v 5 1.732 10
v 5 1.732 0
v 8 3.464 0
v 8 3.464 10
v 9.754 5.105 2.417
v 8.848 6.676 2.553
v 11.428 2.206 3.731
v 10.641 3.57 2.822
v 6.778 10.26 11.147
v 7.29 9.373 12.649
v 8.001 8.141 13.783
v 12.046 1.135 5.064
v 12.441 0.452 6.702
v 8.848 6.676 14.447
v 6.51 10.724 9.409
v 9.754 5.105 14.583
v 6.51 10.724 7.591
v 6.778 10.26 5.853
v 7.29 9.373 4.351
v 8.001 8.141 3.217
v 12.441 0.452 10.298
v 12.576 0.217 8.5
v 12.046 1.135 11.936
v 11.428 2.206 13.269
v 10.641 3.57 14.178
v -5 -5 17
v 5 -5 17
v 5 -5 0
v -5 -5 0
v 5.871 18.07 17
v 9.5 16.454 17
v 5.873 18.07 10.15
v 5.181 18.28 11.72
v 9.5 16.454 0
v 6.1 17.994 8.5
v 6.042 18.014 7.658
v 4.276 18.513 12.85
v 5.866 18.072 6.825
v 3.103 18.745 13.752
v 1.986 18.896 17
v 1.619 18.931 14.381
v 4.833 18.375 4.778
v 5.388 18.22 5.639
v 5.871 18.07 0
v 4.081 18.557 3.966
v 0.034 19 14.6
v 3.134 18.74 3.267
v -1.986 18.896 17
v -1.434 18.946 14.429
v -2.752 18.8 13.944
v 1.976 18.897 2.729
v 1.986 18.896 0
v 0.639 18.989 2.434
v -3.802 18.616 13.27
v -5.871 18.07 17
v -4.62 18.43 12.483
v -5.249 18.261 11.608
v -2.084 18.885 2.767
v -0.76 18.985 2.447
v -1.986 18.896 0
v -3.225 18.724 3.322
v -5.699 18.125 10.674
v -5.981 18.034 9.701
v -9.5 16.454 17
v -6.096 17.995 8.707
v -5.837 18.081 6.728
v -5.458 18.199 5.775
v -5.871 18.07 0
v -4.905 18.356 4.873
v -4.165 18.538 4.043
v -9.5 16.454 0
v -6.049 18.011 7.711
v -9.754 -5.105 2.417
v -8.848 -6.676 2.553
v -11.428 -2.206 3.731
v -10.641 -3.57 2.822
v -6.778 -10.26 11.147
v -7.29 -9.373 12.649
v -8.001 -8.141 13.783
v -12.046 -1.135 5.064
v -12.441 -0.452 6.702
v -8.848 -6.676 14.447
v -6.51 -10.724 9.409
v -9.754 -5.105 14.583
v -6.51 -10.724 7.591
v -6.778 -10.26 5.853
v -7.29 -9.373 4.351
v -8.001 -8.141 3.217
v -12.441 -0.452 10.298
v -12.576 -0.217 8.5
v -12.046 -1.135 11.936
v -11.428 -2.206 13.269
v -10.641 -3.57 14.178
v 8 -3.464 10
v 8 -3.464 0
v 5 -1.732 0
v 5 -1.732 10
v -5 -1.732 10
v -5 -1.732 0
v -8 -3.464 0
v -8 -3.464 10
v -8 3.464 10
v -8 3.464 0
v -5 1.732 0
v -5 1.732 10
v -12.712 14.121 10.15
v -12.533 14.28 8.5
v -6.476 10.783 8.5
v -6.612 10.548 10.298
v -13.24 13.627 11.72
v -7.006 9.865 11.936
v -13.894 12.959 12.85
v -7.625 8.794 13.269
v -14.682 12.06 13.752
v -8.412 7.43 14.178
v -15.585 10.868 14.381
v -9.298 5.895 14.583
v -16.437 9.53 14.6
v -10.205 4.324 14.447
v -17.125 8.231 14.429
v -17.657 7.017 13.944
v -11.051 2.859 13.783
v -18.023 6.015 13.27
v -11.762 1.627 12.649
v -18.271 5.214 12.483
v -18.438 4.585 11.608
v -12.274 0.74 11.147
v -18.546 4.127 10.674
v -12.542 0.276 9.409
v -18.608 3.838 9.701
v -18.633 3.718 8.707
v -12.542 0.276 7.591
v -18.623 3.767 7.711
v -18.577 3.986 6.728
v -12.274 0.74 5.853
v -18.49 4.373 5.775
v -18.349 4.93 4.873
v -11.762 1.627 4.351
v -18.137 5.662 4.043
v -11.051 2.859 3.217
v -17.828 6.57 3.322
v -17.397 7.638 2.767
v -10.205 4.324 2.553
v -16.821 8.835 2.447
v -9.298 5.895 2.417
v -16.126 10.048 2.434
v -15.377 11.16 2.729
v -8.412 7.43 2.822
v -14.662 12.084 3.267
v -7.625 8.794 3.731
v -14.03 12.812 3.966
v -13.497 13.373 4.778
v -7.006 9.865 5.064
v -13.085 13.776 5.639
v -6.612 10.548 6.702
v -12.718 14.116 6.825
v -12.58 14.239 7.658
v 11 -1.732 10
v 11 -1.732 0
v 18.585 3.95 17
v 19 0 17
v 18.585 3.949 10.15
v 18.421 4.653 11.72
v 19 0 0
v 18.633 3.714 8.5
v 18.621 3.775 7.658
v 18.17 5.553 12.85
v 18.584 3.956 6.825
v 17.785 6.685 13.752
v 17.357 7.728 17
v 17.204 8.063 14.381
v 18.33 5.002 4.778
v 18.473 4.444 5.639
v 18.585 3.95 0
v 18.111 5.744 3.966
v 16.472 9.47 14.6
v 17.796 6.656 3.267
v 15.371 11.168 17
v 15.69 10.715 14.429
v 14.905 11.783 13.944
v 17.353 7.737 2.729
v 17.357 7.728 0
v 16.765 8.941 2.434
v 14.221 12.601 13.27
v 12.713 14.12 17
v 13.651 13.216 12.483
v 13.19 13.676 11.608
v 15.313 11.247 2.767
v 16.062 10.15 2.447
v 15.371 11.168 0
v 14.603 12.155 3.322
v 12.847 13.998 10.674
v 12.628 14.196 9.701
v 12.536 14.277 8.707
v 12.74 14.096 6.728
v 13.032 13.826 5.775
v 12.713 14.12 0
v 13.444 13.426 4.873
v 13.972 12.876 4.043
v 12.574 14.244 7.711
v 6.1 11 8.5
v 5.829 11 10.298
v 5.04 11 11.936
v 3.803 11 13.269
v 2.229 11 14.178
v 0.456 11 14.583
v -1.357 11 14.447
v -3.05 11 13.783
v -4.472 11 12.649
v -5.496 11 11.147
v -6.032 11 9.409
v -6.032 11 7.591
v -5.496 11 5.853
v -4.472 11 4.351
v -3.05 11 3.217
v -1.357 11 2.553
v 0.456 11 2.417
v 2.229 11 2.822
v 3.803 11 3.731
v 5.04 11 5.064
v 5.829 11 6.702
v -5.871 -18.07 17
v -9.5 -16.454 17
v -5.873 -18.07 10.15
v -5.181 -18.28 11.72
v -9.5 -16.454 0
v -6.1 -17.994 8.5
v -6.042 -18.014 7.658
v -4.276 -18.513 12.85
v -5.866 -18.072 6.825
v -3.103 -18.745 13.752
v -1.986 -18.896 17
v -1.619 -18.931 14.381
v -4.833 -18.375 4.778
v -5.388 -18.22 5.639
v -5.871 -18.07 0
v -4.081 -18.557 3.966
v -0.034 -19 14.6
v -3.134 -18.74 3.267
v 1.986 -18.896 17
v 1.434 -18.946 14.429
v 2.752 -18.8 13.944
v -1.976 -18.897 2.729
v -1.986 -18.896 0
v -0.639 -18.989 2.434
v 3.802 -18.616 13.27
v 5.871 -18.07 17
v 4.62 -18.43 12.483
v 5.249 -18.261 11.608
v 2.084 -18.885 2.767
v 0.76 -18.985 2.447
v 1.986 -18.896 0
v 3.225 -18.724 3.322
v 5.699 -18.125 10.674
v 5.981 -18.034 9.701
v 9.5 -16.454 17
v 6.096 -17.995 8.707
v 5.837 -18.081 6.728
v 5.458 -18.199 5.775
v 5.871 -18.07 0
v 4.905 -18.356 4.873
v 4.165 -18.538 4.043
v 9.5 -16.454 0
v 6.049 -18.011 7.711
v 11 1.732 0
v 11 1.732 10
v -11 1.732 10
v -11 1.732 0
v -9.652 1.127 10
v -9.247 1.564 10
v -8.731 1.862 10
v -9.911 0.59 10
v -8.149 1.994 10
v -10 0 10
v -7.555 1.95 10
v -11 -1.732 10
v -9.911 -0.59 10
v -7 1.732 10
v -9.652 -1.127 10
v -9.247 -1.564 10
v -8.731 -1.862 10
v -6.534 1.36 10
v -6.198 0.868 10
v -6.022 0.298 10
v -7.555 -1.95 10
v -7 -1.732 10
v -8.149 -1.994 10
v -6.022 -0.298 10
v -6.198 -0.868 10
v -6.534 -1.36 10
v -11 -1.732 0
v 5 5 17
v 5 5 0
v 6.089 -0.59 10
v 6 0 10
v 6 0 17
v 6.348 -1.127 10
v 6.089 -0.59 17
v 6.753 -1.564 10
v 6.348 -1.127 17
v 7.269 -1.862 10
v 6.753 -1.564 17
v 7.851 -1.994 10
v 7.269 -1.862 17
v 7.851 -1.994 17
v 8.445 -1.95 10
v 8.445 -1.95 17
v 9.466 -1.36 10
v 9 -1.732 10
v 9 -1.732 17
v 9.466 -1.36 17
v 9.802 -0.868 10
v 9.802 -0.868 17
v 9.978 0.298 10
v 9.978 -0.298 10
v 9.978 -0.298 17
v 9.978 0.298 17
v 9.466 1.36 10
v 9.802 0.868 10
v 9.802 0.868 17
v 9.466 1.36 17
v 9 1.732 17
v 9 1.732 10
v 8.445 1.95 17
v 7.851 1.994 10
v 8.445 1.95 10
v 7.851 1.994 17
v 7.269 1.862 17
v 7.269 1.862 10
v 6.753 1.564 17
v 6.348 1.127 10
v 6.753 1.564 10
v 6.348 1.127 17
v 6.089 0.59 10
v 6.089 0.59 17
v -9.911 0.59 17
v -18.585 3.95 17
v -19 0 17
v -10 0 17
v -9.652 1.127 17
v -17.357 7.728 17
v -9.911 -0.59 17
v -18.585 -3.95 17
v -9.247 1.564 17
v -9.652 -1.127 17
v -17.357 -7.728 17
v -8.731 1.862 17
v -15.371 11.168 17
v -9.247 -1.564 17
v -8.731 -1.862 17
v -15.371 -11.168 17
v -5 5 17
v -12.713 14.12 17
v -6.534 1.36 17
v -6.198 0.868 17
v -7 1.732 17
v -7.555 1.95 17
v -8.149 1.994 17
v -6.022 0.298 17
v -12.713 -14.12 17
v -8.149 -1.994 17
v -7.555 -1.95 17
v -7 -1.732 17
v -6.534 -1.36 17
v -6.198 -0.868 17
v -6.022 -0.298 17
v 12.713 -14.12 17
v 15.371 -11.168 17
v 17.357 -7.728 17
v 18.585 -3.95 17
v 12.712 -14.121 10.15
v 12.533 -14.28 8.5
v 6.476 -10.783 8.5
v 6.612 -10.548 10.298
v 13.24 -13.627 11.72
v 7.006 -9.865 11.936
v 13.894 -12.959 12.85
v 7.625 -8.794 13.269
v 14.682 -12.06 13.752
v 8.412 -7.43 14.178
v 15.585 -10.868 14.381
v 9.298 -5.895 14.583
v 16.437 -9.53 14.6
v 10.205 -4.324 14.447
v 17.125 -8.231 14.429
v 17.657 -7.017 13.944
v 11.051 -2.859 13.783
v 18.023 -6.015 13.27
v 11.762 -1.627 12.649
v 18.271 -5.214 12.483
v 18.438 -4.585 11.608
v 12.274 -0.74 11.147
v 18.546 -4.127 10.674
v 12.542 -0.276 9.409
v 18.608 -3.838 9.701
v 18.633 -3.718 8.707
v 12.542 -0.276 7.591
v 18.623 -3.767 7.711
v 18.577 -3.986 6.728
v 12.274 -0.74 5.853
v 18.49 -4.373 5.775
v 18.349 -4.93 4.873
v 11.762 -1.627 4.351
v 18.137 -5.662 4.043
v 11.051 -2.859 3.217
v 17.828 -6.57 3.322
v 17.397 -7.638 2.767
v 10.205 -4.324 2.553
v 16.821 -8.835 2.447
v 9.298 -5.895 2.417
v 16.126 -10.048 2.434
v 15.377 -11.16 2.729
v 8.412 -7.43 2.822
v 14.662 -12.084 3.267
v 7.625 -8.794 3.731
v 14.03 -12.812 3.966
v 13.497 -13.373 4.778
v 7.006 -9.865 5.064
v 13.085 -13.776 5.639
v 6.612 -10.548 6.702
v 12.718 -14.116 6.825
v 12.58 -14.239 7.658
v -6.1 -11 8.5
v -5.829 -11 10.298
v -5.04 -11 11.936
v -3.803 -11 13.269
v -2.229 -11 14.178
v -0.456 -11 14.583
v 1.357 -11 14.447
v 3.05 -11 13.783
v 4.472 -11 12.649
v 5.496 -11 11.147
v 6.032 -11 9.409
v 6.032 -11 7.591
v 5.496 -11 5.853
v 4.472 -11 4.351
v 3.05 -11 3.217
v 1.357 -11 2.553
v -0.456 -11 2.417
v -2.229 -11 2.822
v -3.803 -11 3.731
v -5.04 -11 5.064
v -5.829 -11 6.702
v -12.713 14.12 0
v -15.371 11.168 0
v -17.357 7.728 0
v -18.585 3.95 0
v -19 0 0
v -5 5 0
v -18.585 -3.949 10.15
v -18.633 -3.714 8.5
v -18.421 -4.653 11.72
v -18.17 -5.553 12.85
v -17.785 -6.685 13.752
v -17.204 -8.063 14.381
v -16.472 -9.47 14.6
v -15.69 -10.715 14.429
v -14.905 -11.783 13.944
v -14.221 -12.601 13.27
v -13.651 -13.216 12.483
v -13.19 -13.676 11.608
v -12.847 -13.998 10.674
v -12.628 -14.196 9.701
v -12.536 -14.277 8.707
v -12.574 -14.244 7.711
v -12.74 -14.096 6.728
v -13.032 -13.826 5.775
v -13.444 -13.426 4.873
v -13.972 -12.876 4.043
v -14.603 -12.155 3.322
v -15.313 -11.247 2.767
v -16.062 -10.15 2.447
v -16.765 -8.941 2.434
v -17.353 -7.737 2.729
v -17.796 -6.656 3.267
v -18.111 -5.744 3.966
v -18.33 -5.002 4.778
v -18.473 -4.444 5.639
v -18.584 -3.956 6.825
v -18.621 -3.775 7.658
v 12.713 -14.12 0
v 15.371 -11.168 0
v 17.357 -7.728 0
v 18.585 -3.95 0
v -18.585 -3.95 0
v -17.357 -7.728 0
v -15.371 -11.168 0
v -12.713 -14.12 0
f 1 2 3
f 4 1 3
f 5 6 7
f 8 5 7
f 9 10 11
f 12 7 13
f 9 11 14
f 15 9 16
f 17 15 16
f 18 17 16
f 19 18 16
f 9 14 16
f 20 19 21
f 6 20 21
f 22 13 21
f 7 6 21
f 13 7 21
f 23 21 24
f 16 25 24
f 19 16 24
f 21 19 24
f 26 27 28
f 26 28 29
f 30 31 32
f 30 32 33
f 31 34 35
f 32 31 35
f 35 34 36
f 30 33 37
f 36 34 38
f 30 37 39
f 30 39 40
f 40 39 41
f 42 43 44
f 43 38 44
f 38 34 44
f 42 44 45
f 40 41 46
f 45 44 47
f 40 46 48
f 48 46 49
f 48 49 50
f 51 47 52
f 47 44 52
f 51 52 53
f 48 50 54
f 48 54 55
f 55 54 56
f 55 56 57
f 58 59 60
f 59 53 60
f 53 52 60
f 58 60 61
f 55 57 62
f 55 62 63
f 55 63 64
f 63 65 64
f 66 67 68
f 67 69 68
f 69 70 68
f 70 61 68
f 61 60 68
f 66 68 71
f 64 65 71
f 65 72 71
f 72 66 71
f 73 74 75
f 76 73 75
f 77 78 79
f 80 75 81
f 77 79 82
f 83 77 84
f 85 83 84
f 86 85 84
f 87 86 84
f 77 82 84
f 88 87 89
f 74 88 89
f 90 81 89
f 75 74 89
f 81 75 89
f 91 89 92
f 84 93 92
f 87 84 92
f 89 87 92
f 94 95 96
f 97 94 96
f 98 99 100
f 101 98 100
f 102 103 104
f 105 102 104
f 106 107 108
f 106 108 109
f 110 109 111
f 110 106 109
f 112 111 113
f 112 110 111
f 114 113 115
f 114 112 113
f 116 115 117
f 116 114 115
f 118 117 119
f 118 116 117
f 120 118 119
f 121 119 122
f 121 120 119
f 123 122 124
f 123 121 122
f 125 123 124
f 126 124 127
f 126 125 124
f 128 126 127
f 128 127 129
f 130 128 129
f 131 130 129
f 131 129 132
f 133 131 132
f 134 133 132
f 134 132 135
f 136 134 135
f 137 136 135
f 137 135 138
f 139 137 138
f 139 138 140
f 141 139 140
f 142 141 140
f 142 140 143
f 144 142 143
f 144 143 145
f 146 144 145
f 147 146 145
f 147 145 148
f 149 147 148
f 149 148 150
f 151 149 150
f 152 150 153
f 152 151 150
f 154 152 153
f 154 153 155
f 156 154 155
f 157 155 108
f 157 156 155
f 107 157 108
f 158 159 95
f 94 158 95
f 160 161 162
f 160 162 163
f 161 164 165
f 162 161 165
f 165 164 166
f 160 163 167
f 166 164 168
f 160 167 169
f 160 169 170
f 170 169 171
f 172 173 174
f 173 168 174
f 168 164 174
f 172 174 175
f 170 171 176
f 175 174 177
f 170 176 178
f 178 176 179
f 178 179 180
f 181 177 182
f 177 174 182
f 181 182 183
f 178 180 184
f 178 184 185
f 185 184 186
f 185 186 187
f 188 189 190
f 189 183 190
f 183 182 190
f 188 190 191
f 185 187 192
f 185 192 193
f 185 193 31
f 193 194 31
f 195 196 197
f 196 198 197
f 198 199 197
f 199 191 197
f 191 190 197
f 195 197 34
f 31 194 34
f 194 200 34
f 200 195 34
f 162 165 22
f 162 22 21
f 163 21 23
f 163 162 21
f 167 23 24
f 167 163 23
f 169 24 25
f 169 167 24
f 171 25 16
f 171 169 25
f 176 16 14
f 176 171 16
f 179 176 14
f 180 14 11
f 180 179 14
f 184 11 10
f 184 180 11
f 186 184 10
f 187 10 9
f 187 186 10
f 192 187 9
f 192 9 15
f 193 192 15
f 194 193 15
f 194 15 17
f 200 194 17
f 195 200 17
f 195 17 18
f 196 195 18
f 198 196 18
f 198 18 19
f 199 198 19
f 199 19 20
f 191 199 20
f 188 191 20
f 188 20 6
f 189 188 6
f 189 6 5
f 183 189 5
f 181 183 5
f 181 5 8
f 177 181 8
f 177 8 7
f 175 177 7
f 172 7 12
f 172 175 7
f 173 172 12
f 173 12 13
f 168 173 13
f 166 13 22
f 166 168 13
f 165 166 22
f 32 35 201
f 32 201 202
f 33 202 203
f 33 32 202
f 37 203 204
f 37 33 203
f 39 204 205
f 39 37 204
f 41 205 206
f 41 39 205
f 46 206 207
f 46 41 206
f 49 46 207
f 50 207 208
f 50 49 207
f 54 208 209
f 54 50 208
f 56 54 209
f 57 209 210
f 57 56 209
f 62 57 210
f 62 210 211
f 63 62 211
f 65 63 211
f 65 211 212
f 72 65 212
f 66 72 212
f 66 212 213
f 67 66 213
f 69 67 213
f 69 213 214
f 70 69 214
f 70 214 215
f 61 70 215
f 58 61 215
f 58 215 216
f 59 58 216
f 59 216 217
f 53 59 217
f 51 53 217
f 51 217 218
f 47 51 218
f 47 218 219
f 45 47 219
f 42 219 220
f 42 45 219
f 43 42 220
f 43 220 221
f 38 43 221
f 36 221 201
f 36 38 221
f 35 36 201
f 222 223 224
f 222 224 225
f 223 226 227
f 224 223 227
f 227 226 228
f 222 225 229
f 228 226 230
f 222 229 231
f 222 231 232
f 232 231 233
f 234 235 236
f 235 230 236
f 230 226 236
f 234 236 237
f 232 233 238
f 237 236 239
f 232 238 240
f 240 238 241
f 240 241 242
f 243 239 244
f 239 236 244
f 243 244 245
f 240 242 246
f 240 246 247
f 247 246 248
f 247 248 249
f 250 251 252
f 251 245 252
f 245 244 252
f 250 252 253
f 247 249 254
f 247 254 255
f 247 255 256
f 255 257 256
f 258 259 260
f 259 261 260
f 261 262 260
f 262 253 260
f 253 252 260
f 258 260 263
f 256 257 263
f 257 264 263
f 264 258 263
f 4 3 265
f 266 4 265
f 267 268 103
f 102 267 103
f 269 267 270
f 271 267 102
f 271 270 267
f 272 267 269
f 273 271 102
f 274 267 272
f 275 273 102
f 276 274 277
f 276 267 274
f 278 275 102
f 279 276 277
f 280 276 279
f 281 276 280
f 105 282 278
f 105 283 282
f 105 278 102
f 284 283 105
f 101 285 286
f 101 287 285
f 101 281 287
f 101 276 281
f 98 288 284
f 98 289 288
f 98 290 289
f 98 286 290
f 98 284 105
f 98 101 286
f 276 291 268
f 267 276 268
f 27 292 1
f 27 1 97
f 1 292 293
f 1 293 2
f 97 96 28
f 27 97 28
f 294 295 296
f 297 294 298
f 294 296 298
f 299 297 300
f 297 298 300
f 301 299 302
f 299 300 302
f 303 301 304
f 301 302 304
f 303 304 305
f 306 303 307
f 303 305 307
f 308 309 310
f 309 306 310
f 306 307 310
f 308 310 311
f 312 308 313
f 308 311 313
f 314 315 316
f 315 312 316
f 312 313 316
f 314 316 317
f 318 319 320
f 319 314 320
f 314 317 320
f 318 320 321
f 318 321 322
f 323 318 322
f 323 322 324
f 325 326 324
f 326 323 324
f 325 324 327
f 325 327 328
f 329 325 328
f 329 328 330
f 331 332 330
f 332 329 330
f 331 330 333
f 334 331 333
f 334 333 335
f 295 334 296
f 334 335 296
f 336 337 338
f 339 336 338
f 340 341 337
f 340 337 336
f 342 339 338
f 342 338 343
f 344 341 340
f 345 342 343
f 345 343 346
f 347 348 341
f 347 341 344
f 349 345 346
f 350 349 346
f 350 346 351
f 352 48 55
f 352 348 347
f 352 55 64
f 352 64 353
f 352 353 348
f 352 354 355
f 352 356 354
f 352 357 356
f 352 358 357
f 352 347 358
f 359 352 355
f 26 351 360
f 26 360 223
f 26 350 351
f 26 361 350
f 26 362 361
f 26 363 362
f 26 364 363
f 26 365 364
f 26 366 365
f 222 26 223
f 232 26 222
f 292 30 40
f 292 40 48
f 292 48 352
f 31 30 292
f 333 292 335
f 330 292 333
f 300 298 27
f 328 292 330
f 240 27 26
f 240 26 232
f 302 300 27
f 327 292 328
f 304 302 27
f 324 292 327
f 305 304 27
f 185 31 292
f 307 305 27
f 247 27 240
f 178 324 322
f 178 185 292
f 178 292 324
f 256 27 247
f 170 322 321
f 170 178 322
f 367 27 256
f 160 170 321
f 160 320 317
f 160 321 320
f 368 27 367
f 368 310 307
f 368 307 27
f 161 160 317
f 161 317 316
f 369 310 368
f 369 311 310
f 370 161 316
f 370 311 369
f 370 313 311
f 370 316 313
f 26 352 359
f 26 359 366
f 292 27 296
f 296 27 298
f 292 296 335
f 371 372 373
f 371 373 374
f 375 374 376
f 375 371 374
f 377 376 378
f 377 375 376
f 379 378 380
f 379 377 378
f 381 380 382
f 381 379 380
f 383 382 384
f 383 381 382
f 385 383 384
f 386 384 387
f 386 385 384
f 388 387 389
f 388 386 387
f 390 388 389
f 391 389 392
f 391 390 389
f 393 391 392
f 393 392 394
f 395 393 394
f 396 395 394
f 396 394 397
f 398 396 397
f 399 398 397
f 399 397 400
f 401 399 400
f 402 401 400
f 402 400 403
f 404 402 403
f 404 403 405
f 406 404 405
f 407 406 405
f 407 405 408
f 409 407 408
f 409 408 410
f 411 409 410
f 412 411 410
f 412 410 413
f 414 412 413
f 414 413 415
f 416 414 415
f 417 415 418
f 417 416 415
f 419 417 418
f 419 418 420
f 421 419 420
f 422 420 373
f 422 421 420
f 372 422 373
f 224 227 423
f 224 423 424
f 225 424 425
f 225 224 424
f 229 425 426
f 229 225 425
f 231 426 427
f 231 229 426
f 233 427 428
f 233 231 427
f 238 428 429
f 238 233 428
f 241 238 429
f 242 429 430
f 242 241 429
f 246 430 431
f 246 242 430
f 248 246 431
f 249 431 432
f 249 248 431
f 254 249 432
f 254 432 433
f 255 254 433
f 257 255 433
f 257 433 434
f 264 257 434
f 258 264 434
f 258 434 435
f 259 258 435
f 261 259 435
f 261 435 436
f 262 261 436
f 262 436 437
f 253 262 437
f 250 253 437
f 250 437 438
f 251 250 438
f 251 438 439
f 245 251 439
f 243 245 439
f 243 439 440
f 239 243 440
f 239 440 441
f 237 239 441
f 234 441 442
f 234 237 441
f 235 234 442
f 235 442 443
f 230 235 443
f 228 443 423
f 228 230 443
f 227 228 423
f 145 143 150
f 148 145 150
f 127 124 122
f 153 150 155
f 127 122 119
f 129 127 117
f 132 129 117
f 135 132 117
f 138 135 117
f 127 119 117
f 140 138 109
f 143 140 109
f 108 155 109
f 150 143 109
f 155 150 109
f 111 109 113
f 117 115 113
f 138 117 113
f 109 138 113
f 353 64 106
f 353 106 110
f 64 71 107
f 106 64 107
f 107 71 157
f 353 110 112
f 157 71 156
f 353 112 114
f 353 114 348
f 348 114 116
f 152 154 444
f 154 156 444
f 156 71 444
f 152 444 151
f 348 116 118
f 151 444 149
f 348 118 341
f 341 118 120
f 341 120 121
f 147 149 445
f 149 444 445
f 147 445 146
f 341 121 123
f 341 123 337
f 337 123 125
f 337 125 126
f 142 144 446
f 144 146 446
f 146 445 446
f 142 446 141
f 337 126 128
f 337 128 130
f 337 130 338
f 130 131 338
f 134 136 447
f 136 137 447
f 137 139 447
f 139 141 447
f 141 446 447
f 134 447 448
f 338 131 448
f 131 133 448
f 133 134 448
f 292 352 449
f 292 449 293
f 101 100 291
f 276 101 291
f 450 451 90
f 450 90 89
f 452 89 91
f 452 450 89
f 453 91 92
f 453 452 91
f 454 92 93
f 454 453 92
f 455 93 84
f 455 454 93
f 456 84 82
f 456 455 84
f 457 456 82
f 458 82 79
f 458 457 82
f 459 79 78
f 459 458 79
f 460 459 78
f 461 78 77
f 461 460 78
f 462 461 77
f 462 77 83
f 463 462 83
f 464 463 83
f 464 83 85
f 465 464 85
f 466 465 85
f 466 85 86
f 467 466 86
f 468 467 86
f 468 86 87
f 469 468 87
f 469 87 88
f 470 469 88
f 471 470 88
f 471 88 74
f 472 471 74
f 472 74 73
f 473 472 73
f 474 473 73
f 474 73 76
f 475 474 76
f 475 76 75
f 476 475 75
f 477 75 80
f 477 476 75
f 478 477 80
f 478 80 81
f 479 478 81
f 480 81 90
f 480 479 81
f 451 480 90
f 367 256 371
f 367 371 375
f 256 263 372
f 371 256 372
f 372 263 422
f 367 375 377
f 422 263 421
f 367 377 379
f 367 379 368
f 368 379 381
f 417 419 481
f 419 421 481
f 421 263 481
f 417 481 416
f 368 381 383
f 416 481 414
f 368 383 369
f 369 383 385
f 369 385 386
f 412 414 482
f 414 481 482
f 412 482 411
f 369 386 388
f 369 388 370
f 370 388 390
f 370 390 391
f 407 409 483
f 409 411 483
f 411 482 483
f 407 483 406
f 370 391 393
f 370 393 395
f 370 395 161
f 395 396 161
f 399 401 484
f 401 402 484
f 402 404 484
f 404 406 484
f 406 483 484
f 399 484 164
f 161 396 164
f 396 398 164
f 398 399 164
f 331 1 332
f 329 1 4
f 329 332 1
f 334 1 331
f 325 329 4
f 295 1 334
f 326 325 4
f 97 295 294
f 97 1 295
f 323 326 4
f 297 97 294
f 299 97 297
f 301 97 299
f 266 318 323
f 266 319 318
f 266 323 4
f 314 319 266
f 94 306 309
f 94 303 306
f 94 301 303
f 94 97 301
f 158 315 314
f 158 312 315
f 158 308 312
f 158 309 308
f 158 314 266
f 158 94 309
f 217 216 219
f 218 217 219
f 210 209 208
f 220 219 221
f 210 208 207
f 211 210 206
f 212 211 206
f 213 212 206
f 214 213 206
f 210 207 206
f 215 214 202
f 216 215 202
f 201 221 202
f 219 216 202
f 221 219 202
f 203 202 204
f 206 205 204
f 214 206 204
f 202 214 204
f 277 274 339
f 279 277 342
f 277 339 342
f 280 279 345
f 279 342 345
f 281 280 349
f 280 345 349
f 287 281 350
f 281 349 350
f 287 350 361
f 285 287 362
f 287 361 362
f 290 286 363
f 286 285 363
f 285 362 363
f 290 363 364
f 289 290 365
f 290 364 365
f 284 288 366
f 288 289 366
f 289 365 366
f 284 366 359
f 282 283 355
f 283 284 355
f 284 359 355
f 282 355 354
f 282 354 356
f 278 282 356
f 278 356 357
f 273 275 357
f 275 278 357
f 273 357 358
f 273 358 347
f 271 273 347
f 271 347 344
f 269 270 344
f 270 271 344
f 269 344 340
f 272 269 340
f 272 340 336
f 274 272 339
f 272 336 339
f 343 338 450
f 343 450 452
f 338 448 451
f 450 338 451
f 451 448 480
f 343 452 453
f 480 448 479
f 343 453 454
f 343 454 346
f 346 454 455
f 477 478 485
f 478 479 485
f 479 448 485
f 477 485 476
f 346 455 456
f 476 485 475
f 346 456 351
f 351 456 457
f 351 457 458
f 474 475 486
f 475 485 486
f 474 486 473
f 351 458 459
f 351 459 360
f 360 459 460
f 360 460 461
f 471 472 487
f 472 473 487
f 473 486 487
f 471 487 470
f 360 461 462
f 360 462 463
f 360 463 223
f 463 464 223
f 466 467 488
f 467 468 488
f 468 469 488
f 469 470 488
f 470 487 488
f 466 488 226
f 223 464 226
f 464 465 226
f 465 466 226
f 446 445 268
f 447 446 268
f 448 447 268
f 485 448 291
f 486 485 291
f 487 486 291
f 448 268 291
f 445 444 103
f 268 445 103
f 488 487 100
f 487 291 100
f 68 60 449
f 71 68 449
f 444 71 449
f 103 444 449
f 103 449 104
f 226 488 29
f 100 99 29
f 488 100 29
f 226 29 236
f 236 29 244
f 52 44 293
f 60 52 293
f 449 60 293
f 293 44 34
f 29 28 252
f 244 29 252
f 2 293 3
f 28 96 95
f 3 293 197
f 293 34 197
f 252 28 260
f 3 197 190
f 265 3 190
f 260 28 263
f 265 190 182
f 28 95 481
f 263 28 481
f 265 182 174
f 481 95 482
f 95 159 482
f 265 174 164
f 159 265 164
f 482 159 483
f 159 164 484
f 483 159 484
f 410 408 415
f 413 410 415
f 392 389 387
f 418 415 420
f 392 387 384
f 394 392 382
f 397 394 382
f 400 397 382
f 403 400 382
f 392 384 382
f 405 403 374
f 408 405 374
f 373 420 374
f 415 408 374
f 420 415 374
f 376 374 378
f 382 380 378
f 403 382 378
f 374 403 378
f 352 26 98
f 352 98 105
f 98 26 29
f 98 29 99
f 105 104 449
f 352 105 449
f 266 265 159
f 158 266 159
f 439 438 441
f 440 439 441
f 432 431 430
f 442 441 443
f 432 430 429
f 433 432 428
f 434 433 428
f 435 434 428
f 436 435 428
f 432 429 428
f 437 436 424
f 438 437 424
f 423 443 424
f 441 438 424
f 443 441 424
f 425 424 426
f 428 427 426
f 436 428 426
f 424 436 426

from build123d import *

# Parameters (mm, degrees)
F1_DEPTH  = 17
F5_R      = 6.1
F6_DEPTH  = 9
F7_COUNT  = 6
F9_D      = 4
F10_R     = 2
F11_DEPTH = 10
F12_DEPTH = 17.0010001


with BuildPart() as f1:
    # F0 (on Top) → F1 (new body)
    with BuildSketch(Plane.XY):
        with BuildLine():
            Line((0, 0), (9.5, 16.4544826719))
            ThreePointArc((9.5, 16.4544826719), (0, 19), (-9.5, 16.4544826719))
            Line((-9.5, 16.4544826719), (0, 0))
        make_face()
    extrude(amount=F1_DEPTH)

    # F5 (on offset) → F6 (cut)
    with BuildSketch(Plane.XZ.offset(-20)):
        with Locations((0, 8.5)):
            Circle(F5_R)
    extrude(amount=F6_DEPTH, mode=Mode.SUBTRACT)

    # F7: F1 ×6 about axis
    f7_axis = Axis((0, 0, 0), (0, 0, 1))


with BuildPart() as f1_1:
    add(f1.part)
    for i in range(1, F7_COUNT):
        add(f1.part.rotate(f7_axis, i * 360 / F7_COUNT))

    # F9 (through all)
    with Locations(Plane(origin=(0, 0, 0), x_dir=(1, 0, 0), z_dir=(0, 0, -1))):
        with Locations((-8, 0), (8, 0)):
            Hole(F9_D / 2)

    # F10 (on face) → F11 (cut)
    with BuildSketch(Plane(origin=(0, 0, 0), x_dir=(1, 0, 0), z_dir=(0, 0, -1))):
        Polygon((-5, -1.7320508076), (-5, 1.7320508076), (-8, 3.4641016151), (-11, 1.7320508076), (-11, -1.7320508076), (-8, -3.4641016151), align=None)
        with Locations((-8, 0)):
            Circle(F10_R, mode=Mode.SUBTRACT)
        Polygon((5, 1.7320508076), (5, -1.7320508076), (8, -3.4641016151), (11, -1.7320508076), (11, 1.7320508076), (8, 3.4641016151), align=None)
        with Locations((8, 0)):
            Circle(F10_R, mode=Mode.SUBTRACT)
    extrude(amount=-F11_DEPTH, mode=Mode.SUBTRACT)

    # F8 (on face) → F12 (cut, through all)
    with BuildSketch(Plane(origin=(0, 0, 0), x_dir=(1, 0, 0), z_dir=(0, 0, -1))):
        with BuildLine():
            Line((0, 2.1), (0, 5))
            Line((0, 5), (-5, 5))
            Line((-5, 5), (-5, -5))
            Line((-5, -5), (5, -5))
            Line((5, -5), (5, 5))
            Line((5, 5), (2.8867513459, 5))
            Line((2.8867513459, 5), (1.05, 1.8186533479))
            ThreePointArc((1.05, 1.8186533479), (1.0751032483, 1.8039271065), (1.1, 1.788854382))
            ThreePointArc((1.1, 1.788854382), (1.833030278, 1.0246950766), (2.1, 0))
            ThreePointArc((2.1, 0), (1.833030278, -1.0246950766), (1.1, -1.788854382))
            ThreePointArc((1.1, -1.788854382), (0, -2.1), (-1.1, -1.788854382))
            ThreePointArc((-1.1, -1.788854382), (-2.1, 0), (-1.1, 1.788854382))
            ThreePointArc((-1.1, 1.788854382), (-0.5715793024, 2.020716977), (0, 2.1))
        make_face()
        with BuildLine():
            Line((2.8867513459, 5), (0, 5))
            Line((0, 5), (0, 2.1))
            ThreePointArc((0, 2.1), (0.5435199947, 2.0284442352), (1.05, 1.8186533479))
            Line((1.05, 1.8186533479), (2.8867513459, 5))
        make_face()
        with BuildLine():
            Line((0, 0), (0, 2.1))
            ThreePointArc((0, 2.1), (-0.5715793024, 2.020716977), (-1.1, 1.788854382))
            Line((-1.1, 1.788854382), (-1.1, -1.788854382))
            ThreePointArc((-1.1, -1.788854382), (0, -2.1), (1.1, -1.788854382))
            Line((1.1, -1.788854382), (1.1, 1.788854382))
            ThreePointArc((1.1, 1.788854382), (1.0751032483, 1.8039271065), (1.05, 1.8186533479))
            Line((1.05, 1.8186533479), (0, 0))
        make_face()
        with BuildLine():
            Line((-1.1, -1.788854382), (-1.1, 1.788854382))
            ThreePointArc((-1.1, 1.788854382), (-2.1, 0), (-1.1, -1.788854382))
        make_face()
        with BuildLine():
            ThreePointArc((2.1, 0), (1.833030278, 1.0246950766), (1.1, 1.788854382))
            Line((1.1, 1.788854382), (1.1, -1.788854382))
            ThreePointArc((1.1, -1.788854382), (1.833030278, -1.0246950766), (2.1, 0))
        make_face()
        with BuildLine():
            ThreePointArc((1.05, 1.8186533479), (0.5435199947, 2.0284442352), (0, 2.1))
            Line((0, 2.1), (0, 0))
            Line((0, 0), (1.05, 1.8186533479))
        make_face()
    extrude(amount=-F12_DEPTH, mode=Mode.SUBTRACT)


solid = f1_1.part
